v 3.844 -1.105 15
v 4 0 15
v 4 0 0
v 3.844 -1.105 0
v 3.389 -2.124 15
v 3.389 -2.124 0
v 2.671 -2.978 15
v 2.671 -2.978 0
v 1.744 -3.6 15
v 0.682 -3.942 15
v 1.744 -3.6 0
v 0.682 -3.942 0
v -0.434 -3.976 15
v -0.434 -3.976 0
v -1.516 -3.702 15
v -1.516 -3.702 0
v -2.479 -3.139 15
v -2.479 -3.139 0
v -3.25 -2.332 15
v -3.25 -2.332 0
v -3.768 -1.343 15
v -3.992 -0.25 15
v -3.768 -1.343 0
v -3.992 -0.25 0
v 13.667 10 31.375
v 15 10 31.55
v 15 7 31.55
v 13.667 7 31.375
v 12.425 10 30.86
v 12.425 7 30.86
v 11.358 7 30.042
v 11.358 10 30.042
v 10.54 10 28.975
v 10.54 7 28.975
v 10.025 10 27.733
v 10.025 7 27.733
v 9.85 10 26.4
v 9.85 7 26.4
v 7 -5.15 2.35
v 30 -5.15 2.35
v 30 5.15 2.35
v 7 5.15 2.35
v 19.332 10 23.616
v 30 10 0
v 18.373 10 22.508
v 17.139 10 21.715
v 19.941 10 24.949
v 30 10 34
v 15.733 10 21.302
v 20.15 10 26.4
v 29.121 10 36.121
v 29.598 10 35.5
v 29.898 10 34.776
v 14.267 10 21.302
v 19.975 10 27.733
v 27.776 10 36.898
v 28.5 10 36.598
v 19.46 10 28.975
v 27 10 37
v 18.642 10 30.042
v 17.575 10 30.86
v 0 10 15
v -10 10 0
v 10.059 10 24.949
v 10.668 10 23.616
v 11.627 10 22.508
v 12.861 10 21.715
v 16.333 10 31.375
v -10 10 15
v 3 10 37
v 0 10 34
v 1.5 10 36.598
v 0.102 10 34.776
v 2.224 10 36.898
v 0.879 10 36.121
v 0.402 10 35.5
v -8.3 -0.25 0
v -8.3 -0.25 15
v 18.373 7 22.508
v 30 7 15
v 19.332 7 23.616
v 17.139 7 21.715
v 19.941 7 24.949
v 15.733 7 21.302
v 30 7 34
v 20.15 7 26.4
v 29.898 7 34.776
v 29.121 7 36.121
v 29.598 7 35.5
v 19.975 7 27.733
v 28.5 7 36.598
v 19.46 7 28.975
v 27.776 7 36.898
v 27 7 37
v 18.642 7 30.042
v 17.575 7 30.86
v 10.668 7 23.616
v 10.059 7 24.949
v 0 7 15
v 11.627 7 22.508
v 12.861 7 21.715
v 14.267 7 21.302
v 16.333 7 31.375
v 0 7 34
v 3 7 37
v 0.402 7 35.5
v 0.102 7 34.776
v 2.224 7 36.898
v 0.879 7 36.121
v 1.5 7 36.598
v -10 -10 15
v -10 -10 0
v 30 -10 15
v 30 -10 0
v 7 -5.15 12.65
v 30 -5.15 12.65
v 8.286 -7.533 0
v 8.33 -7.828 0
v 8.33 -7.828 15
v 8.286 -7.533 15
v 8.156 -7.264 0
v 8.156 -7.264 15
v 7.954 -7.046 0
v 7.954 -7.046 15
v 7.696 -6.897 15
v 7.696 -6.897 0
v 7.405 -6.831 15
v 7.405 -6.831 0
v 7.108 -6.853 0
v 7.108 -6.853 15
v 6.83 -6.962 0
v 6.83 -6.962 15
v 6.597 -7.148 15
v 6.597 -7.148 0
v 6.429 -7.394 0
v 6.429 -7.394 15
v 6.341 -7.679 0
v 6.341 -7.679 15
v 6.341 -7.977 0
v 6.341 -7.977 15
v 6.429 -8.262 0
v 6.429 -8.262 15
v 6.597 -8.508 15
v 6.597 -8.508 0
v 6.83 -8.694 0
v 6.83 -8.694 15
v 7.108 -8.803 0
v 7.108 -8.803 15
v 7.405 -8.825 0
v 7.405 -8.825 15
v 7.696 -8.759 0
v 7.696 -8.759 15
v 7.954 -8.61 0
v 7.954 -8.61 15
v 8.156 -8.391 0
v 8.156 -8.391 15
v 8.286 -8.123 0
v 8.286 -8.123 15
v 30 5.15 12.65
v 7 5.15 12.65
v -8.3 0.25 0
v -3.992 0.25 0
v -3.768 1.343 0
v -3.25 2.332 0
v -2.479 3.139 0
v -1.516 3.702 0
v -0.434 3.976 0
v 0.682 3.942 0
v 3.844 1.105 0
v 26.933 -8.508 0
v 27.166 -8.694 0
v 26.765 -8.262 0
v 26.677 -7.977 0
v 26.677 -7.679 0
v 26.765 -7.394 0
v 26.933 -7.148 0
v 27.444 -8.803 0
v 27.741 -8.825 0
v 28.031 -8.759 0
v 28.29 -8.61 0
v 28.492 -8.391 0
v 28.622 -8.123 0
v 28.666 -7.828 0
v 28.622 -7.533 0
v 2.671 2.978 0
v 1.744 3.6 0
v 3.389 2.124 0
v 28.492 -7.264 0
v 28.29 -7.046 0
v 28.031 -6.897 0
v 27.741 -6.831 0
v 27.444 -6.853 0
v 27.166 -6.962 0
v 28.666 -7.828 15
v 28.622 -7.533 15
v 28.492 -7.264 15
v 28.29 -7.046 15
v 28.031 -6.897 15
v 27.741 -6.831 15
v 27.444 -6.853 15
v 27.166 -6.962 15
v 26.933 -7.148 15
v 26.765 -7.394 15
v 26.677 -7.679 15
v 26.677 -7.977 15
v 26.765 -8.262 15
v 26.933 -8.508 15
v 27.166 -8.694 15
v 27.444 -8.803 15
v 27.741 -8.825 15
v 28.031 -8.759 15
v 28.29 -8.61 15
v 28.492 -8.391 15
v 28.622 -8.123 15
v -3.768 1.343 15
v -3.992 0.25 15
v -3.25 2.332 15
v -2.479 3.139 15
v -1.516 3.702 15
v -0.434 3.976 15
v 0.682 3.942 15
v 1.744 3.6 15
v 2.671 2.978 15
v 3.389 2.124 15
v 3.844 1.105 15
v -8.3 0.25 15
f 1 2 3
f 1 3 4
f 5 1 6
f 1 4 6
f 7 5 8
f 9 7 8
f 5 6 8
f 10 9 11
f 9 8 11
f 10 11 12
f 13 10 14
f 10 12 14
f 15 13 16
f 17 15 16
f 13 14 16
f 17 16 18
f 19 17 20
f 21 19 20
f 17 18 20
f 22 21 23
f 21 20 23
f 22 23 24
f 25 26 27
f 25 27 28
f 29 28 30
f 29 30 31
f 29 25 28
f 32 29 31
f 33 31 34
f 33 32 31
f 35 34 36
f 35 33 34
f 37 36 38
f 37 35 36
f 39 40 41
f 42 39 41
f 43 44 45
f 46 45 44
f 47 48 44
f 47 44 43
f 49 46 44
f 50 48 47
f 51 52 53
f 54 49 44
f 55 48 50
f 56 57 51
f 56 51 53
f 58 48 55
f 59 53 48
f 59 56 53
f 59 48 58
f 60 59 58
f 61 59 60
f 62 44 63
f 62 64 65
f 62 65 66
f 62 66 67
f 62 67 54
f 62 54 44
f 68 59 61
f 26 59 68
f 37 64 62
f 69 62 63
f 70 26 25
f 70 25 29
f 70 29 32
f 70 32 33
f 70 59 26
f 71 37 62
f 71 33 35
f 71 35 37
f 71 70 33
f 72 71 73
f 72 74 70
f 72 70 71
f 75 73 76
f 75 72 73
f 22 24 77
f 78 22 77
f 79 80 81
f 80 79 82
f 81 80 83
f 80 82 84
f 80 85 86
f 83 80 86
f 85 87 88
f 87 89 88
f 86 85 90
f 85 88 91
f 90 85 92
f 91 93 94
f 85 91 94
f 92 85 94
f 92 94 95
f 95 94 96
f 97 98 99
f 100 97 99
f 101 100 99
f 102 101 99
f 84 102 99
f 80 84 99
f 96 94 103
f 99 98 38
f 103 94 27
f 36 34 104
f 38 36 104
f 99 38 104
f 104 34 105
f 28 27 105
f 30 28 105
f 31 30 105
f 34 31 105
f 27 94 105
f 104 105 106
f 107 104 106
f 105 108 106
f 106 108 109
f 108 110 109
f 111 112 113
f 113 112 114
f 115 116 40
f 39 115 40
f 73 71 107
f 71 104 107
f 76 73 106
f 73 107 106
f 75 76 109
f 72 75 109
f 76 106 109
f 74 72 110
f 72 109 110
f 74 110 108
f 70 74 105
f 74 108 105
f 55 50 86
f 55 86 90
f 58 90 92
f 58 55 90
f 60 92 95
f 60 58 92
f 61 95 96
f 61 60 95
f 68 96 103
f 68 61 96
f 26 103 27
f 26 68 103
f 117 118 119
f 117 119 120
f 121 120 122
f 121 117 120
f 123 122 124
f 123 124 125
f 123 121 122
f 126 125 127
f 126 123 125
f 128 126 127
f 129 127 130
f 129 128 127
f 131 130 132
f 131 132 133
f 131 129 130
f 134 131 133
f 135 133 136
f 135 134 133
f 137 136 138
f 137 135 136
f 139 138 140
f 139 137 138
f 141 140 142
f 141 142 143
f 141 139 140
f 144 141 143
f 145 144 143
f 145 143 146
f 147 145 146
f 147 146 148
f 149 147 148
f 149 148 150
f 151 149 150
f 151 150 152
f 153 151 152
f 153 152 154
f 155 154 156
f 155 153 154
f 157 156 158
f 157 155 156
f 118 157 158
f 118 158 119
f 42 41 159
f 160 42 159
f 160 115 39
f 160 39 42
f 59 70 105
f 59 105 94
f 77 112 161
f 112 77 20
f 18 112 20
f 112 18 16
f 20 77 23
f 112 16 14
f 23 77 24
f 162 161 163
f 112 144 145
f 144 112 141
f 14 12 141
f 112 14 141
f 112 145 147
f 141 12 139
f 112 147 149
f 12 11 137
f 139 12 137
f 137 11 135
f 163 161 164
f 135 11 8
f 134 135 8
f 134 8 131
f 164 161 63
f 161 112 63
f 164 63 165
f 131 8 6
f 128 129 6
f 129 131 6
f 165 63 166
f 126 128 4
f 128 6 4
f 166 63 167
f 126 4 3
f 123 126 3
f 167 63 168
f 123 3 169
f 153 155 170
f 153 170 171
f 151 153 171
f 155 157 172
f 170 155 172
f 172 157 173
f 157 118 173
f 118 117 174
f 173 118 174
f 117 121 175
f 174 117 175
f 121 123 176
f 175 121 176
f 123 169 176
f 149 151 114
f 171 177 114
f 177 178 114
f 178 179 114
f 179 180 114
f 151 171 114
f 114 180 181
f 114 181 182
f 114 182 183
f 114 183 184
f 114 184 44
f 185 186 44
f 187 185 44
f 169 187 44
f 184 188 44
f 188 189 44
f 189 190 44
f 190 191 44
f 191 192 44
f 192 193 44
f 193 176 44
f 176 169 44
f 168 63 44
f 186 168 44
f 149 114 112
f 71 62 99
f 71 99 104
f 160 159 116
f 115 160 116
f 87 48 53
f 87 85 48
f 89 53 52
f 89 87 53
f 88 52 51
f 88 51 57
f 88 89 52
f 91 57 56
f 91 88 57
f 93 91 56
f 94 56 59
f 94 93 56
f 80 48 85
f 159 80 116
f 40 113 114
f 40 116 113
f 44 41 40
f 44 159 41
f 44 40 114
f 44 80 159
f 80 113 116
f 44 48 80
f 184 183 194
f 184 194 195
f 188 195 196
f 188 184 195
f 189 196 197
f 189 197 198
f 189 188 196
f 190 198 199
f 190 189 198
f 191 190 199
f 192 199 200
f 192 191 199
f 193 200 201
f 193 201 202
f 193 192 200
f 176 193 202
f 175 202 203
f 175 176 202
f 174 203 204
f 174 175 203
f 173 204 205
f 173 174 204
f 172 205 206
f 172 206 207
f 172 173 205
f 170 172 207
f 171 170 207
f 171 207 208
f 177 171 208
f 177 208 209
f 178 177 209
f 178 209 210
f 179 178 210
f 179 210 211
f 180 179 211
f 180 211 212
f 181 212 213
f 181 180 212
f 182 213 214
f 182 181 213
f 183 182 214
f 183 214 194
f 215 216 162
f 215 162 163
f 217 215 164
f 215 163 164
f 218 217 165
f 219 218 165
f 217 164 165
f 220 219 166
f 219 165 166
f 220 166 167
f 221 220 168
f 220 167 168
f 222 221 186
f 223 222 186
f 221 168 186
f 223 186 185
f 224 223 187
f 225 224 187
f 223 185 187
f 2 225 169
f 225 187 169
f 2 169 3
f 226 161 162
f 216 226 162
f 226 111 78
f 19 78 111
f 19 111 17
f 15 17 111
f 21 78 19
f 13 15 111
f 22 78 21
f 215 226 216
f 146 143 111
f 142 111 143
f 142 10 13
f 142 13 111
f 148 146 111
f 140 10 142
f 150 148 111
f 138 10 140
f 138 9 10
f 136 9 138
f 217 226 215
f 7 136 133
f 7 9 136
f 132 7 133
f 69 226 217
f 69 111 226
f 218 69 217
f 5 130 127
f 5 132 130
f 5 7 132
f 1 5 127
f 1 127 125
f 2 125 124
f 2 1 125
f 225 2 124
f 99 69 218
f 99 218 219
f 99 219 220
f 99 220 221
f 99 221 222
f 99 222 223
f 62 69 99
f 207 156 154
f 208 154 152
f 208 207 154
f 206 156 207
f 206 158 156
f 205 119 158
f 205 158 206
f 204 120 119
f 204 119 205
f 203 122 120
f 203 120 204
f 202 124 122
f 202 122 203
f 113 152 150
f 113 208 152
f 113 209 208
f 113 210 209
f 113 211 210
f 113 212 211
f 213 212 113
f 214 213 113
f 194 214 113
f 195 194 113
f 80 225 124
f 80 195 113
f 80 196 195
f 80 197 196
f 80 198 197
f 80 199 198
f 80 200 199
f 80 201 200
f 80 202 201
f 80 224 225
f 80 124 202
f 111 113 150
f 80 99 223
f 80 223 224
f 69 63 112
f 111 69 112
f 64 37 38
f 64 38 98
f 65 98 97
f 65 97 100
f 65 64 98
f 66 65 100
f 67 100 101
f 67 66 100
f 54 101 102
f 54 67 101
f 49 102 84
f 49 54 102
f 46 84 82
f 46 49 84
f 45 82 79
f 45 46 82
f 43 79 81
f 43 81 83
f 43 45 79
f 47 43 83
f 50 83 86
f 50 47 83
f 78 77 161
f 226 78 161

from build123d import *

# Parameters (mm, degrees)
F0_R     = 1
F1_DEPTH = 15
F3_DEPTH = 23
F4_W     = 30
F4_H     = 15
F5_DEPTH = 3
F6_R     = 3


with BuildPart() as f1:
    # F0 (on Top) → F1 (new body)
    with BuildSketch(Plane.XY):
        Polygon((-10, 10), (-10, -10), (10, -10), (10, 7.8278025612), (10, 10), align=None)
        with Locations((7.3302448727, -7.8278025612)):
            Circle(F0_R, mode=Mode.SUBTRACT)
        with BuildLine():
            ThreePointArc((-3.9921798557, 0.25), (0.1250611397, 3.9980444859), (4, 0))
            ThreePointArc((4, 0), (0.1250611397, -3.9980444859), (-3.9921798557, -0.25))
            Line((-3.9921798557, -0.25), (-8.3, -0.25))
            Line((-8.3, -0.25), (-8.3, 0))
            Line((-8.3, 0), (-8.3, 0.25))
            Line((-8.3, 0.25), (-3.9921798557, 0.25))
        make_face(mode=Mode.SUBTRACT)
        with Locations((7.3302448727, 7.8278025612)):
            Circle(F0_R, mode=Mode.SUBTRACT)
        Polygon((10, 7.8278025612), (10, -10), (30, -10), (30, 10), (10, 10), align=None)
        with Locations((27.6660211384, -7.8278025612)):
            Circle(F0_R, mode=Mode.SUBTRACT)
        with BuildLine():
            ThreePointArc((28.6660211384, 7.8278025612), (27.6660211384, 6.8278025612), (26.6660211384, 7.8278025612))
            ThreePointArc((26.6660211384, 7.8278025612), (27.6660211384, 8.8278025612), (28.6660211384, 7.8278025612))
        make_face(mode=Mode.SUBTRACT)
        with Locations((7.3302448727, 7.8278025612)):
            Circle(F0_R)
        with BuildLine():
            ThreePointArc((28.6660211384, 7.8278025612), (27.6660211384, 8.8278025612), (26.6660211384, 7.8278025612))
            ThreePointArc((26.6660211384, 7.8278025612), (27.6660211384, 6.8278025612), (28.6660211384, 7.8278025612))
        make_face()
    extrude(amount=F1_DEPTH)

    # F2 (on face) → F3 (cut)
    with BuildSketch(Plane.YZ.offset(30)):
        Polygon((-5.15, 12.65), (-5.15, 7.5), (-5.15, 2.35), (5.15, 2.35), (5.15, 12.65), align=None)
    extrude(amount=-F3_DEPTH, mode=Mode.SUBTRACT)

    # F4 (on face) → F5 (join)
    with BuildSketch(Plane(origin=(0, 10, 0), x_dir=(-1, 0, 0), z_dir=(0, 1, 0))):
        with BuildLine():
            Line((-30, 37), (-30, 26.4))
            Line((-30, 26.4), (-20.15, 26.4))
            ThreePointArc((-20.15, 26.4), (-18.6415999231, 30.0415999231), (-15, 31.55))
            Line((-15, 31.55), (-15, 37))
            Line((-15, 37), (-30, 37))
        make_face()
        with Locations((-15, 7.5)):
            Rectangle(F4_W, F4_H)
        with BuildLine():
            Line((-30, 26.4), (-30, 15))
            Line((-30, 15), (0, 15))
            Line((0, 15), (0, 37))
            Line((0, 37), (-15, 37))
            Line((-15, 37), (-15, 31.55))
            ThreePointArc((-15, 31.55), (-11.3584000769, 30.0415999231), (-9.85, 26.4))
            ThreePointArc((-9.85, 26.4), (-15, 21.25), (-20.15, 26.4))
            Line((-20.15, 26.4), (-30, 26.4))
        make_face()
    extrude(amount=-F5_DEPTH)

    # F6
    f6_edges = [f1.edges().sort_by_distance(p)[0] for p in [
        (30, 8.5, 37),
        (0, 8.5, 37),
    ]]
    fillet(f6_edges, radius=F6_R)


solid = f1.part
